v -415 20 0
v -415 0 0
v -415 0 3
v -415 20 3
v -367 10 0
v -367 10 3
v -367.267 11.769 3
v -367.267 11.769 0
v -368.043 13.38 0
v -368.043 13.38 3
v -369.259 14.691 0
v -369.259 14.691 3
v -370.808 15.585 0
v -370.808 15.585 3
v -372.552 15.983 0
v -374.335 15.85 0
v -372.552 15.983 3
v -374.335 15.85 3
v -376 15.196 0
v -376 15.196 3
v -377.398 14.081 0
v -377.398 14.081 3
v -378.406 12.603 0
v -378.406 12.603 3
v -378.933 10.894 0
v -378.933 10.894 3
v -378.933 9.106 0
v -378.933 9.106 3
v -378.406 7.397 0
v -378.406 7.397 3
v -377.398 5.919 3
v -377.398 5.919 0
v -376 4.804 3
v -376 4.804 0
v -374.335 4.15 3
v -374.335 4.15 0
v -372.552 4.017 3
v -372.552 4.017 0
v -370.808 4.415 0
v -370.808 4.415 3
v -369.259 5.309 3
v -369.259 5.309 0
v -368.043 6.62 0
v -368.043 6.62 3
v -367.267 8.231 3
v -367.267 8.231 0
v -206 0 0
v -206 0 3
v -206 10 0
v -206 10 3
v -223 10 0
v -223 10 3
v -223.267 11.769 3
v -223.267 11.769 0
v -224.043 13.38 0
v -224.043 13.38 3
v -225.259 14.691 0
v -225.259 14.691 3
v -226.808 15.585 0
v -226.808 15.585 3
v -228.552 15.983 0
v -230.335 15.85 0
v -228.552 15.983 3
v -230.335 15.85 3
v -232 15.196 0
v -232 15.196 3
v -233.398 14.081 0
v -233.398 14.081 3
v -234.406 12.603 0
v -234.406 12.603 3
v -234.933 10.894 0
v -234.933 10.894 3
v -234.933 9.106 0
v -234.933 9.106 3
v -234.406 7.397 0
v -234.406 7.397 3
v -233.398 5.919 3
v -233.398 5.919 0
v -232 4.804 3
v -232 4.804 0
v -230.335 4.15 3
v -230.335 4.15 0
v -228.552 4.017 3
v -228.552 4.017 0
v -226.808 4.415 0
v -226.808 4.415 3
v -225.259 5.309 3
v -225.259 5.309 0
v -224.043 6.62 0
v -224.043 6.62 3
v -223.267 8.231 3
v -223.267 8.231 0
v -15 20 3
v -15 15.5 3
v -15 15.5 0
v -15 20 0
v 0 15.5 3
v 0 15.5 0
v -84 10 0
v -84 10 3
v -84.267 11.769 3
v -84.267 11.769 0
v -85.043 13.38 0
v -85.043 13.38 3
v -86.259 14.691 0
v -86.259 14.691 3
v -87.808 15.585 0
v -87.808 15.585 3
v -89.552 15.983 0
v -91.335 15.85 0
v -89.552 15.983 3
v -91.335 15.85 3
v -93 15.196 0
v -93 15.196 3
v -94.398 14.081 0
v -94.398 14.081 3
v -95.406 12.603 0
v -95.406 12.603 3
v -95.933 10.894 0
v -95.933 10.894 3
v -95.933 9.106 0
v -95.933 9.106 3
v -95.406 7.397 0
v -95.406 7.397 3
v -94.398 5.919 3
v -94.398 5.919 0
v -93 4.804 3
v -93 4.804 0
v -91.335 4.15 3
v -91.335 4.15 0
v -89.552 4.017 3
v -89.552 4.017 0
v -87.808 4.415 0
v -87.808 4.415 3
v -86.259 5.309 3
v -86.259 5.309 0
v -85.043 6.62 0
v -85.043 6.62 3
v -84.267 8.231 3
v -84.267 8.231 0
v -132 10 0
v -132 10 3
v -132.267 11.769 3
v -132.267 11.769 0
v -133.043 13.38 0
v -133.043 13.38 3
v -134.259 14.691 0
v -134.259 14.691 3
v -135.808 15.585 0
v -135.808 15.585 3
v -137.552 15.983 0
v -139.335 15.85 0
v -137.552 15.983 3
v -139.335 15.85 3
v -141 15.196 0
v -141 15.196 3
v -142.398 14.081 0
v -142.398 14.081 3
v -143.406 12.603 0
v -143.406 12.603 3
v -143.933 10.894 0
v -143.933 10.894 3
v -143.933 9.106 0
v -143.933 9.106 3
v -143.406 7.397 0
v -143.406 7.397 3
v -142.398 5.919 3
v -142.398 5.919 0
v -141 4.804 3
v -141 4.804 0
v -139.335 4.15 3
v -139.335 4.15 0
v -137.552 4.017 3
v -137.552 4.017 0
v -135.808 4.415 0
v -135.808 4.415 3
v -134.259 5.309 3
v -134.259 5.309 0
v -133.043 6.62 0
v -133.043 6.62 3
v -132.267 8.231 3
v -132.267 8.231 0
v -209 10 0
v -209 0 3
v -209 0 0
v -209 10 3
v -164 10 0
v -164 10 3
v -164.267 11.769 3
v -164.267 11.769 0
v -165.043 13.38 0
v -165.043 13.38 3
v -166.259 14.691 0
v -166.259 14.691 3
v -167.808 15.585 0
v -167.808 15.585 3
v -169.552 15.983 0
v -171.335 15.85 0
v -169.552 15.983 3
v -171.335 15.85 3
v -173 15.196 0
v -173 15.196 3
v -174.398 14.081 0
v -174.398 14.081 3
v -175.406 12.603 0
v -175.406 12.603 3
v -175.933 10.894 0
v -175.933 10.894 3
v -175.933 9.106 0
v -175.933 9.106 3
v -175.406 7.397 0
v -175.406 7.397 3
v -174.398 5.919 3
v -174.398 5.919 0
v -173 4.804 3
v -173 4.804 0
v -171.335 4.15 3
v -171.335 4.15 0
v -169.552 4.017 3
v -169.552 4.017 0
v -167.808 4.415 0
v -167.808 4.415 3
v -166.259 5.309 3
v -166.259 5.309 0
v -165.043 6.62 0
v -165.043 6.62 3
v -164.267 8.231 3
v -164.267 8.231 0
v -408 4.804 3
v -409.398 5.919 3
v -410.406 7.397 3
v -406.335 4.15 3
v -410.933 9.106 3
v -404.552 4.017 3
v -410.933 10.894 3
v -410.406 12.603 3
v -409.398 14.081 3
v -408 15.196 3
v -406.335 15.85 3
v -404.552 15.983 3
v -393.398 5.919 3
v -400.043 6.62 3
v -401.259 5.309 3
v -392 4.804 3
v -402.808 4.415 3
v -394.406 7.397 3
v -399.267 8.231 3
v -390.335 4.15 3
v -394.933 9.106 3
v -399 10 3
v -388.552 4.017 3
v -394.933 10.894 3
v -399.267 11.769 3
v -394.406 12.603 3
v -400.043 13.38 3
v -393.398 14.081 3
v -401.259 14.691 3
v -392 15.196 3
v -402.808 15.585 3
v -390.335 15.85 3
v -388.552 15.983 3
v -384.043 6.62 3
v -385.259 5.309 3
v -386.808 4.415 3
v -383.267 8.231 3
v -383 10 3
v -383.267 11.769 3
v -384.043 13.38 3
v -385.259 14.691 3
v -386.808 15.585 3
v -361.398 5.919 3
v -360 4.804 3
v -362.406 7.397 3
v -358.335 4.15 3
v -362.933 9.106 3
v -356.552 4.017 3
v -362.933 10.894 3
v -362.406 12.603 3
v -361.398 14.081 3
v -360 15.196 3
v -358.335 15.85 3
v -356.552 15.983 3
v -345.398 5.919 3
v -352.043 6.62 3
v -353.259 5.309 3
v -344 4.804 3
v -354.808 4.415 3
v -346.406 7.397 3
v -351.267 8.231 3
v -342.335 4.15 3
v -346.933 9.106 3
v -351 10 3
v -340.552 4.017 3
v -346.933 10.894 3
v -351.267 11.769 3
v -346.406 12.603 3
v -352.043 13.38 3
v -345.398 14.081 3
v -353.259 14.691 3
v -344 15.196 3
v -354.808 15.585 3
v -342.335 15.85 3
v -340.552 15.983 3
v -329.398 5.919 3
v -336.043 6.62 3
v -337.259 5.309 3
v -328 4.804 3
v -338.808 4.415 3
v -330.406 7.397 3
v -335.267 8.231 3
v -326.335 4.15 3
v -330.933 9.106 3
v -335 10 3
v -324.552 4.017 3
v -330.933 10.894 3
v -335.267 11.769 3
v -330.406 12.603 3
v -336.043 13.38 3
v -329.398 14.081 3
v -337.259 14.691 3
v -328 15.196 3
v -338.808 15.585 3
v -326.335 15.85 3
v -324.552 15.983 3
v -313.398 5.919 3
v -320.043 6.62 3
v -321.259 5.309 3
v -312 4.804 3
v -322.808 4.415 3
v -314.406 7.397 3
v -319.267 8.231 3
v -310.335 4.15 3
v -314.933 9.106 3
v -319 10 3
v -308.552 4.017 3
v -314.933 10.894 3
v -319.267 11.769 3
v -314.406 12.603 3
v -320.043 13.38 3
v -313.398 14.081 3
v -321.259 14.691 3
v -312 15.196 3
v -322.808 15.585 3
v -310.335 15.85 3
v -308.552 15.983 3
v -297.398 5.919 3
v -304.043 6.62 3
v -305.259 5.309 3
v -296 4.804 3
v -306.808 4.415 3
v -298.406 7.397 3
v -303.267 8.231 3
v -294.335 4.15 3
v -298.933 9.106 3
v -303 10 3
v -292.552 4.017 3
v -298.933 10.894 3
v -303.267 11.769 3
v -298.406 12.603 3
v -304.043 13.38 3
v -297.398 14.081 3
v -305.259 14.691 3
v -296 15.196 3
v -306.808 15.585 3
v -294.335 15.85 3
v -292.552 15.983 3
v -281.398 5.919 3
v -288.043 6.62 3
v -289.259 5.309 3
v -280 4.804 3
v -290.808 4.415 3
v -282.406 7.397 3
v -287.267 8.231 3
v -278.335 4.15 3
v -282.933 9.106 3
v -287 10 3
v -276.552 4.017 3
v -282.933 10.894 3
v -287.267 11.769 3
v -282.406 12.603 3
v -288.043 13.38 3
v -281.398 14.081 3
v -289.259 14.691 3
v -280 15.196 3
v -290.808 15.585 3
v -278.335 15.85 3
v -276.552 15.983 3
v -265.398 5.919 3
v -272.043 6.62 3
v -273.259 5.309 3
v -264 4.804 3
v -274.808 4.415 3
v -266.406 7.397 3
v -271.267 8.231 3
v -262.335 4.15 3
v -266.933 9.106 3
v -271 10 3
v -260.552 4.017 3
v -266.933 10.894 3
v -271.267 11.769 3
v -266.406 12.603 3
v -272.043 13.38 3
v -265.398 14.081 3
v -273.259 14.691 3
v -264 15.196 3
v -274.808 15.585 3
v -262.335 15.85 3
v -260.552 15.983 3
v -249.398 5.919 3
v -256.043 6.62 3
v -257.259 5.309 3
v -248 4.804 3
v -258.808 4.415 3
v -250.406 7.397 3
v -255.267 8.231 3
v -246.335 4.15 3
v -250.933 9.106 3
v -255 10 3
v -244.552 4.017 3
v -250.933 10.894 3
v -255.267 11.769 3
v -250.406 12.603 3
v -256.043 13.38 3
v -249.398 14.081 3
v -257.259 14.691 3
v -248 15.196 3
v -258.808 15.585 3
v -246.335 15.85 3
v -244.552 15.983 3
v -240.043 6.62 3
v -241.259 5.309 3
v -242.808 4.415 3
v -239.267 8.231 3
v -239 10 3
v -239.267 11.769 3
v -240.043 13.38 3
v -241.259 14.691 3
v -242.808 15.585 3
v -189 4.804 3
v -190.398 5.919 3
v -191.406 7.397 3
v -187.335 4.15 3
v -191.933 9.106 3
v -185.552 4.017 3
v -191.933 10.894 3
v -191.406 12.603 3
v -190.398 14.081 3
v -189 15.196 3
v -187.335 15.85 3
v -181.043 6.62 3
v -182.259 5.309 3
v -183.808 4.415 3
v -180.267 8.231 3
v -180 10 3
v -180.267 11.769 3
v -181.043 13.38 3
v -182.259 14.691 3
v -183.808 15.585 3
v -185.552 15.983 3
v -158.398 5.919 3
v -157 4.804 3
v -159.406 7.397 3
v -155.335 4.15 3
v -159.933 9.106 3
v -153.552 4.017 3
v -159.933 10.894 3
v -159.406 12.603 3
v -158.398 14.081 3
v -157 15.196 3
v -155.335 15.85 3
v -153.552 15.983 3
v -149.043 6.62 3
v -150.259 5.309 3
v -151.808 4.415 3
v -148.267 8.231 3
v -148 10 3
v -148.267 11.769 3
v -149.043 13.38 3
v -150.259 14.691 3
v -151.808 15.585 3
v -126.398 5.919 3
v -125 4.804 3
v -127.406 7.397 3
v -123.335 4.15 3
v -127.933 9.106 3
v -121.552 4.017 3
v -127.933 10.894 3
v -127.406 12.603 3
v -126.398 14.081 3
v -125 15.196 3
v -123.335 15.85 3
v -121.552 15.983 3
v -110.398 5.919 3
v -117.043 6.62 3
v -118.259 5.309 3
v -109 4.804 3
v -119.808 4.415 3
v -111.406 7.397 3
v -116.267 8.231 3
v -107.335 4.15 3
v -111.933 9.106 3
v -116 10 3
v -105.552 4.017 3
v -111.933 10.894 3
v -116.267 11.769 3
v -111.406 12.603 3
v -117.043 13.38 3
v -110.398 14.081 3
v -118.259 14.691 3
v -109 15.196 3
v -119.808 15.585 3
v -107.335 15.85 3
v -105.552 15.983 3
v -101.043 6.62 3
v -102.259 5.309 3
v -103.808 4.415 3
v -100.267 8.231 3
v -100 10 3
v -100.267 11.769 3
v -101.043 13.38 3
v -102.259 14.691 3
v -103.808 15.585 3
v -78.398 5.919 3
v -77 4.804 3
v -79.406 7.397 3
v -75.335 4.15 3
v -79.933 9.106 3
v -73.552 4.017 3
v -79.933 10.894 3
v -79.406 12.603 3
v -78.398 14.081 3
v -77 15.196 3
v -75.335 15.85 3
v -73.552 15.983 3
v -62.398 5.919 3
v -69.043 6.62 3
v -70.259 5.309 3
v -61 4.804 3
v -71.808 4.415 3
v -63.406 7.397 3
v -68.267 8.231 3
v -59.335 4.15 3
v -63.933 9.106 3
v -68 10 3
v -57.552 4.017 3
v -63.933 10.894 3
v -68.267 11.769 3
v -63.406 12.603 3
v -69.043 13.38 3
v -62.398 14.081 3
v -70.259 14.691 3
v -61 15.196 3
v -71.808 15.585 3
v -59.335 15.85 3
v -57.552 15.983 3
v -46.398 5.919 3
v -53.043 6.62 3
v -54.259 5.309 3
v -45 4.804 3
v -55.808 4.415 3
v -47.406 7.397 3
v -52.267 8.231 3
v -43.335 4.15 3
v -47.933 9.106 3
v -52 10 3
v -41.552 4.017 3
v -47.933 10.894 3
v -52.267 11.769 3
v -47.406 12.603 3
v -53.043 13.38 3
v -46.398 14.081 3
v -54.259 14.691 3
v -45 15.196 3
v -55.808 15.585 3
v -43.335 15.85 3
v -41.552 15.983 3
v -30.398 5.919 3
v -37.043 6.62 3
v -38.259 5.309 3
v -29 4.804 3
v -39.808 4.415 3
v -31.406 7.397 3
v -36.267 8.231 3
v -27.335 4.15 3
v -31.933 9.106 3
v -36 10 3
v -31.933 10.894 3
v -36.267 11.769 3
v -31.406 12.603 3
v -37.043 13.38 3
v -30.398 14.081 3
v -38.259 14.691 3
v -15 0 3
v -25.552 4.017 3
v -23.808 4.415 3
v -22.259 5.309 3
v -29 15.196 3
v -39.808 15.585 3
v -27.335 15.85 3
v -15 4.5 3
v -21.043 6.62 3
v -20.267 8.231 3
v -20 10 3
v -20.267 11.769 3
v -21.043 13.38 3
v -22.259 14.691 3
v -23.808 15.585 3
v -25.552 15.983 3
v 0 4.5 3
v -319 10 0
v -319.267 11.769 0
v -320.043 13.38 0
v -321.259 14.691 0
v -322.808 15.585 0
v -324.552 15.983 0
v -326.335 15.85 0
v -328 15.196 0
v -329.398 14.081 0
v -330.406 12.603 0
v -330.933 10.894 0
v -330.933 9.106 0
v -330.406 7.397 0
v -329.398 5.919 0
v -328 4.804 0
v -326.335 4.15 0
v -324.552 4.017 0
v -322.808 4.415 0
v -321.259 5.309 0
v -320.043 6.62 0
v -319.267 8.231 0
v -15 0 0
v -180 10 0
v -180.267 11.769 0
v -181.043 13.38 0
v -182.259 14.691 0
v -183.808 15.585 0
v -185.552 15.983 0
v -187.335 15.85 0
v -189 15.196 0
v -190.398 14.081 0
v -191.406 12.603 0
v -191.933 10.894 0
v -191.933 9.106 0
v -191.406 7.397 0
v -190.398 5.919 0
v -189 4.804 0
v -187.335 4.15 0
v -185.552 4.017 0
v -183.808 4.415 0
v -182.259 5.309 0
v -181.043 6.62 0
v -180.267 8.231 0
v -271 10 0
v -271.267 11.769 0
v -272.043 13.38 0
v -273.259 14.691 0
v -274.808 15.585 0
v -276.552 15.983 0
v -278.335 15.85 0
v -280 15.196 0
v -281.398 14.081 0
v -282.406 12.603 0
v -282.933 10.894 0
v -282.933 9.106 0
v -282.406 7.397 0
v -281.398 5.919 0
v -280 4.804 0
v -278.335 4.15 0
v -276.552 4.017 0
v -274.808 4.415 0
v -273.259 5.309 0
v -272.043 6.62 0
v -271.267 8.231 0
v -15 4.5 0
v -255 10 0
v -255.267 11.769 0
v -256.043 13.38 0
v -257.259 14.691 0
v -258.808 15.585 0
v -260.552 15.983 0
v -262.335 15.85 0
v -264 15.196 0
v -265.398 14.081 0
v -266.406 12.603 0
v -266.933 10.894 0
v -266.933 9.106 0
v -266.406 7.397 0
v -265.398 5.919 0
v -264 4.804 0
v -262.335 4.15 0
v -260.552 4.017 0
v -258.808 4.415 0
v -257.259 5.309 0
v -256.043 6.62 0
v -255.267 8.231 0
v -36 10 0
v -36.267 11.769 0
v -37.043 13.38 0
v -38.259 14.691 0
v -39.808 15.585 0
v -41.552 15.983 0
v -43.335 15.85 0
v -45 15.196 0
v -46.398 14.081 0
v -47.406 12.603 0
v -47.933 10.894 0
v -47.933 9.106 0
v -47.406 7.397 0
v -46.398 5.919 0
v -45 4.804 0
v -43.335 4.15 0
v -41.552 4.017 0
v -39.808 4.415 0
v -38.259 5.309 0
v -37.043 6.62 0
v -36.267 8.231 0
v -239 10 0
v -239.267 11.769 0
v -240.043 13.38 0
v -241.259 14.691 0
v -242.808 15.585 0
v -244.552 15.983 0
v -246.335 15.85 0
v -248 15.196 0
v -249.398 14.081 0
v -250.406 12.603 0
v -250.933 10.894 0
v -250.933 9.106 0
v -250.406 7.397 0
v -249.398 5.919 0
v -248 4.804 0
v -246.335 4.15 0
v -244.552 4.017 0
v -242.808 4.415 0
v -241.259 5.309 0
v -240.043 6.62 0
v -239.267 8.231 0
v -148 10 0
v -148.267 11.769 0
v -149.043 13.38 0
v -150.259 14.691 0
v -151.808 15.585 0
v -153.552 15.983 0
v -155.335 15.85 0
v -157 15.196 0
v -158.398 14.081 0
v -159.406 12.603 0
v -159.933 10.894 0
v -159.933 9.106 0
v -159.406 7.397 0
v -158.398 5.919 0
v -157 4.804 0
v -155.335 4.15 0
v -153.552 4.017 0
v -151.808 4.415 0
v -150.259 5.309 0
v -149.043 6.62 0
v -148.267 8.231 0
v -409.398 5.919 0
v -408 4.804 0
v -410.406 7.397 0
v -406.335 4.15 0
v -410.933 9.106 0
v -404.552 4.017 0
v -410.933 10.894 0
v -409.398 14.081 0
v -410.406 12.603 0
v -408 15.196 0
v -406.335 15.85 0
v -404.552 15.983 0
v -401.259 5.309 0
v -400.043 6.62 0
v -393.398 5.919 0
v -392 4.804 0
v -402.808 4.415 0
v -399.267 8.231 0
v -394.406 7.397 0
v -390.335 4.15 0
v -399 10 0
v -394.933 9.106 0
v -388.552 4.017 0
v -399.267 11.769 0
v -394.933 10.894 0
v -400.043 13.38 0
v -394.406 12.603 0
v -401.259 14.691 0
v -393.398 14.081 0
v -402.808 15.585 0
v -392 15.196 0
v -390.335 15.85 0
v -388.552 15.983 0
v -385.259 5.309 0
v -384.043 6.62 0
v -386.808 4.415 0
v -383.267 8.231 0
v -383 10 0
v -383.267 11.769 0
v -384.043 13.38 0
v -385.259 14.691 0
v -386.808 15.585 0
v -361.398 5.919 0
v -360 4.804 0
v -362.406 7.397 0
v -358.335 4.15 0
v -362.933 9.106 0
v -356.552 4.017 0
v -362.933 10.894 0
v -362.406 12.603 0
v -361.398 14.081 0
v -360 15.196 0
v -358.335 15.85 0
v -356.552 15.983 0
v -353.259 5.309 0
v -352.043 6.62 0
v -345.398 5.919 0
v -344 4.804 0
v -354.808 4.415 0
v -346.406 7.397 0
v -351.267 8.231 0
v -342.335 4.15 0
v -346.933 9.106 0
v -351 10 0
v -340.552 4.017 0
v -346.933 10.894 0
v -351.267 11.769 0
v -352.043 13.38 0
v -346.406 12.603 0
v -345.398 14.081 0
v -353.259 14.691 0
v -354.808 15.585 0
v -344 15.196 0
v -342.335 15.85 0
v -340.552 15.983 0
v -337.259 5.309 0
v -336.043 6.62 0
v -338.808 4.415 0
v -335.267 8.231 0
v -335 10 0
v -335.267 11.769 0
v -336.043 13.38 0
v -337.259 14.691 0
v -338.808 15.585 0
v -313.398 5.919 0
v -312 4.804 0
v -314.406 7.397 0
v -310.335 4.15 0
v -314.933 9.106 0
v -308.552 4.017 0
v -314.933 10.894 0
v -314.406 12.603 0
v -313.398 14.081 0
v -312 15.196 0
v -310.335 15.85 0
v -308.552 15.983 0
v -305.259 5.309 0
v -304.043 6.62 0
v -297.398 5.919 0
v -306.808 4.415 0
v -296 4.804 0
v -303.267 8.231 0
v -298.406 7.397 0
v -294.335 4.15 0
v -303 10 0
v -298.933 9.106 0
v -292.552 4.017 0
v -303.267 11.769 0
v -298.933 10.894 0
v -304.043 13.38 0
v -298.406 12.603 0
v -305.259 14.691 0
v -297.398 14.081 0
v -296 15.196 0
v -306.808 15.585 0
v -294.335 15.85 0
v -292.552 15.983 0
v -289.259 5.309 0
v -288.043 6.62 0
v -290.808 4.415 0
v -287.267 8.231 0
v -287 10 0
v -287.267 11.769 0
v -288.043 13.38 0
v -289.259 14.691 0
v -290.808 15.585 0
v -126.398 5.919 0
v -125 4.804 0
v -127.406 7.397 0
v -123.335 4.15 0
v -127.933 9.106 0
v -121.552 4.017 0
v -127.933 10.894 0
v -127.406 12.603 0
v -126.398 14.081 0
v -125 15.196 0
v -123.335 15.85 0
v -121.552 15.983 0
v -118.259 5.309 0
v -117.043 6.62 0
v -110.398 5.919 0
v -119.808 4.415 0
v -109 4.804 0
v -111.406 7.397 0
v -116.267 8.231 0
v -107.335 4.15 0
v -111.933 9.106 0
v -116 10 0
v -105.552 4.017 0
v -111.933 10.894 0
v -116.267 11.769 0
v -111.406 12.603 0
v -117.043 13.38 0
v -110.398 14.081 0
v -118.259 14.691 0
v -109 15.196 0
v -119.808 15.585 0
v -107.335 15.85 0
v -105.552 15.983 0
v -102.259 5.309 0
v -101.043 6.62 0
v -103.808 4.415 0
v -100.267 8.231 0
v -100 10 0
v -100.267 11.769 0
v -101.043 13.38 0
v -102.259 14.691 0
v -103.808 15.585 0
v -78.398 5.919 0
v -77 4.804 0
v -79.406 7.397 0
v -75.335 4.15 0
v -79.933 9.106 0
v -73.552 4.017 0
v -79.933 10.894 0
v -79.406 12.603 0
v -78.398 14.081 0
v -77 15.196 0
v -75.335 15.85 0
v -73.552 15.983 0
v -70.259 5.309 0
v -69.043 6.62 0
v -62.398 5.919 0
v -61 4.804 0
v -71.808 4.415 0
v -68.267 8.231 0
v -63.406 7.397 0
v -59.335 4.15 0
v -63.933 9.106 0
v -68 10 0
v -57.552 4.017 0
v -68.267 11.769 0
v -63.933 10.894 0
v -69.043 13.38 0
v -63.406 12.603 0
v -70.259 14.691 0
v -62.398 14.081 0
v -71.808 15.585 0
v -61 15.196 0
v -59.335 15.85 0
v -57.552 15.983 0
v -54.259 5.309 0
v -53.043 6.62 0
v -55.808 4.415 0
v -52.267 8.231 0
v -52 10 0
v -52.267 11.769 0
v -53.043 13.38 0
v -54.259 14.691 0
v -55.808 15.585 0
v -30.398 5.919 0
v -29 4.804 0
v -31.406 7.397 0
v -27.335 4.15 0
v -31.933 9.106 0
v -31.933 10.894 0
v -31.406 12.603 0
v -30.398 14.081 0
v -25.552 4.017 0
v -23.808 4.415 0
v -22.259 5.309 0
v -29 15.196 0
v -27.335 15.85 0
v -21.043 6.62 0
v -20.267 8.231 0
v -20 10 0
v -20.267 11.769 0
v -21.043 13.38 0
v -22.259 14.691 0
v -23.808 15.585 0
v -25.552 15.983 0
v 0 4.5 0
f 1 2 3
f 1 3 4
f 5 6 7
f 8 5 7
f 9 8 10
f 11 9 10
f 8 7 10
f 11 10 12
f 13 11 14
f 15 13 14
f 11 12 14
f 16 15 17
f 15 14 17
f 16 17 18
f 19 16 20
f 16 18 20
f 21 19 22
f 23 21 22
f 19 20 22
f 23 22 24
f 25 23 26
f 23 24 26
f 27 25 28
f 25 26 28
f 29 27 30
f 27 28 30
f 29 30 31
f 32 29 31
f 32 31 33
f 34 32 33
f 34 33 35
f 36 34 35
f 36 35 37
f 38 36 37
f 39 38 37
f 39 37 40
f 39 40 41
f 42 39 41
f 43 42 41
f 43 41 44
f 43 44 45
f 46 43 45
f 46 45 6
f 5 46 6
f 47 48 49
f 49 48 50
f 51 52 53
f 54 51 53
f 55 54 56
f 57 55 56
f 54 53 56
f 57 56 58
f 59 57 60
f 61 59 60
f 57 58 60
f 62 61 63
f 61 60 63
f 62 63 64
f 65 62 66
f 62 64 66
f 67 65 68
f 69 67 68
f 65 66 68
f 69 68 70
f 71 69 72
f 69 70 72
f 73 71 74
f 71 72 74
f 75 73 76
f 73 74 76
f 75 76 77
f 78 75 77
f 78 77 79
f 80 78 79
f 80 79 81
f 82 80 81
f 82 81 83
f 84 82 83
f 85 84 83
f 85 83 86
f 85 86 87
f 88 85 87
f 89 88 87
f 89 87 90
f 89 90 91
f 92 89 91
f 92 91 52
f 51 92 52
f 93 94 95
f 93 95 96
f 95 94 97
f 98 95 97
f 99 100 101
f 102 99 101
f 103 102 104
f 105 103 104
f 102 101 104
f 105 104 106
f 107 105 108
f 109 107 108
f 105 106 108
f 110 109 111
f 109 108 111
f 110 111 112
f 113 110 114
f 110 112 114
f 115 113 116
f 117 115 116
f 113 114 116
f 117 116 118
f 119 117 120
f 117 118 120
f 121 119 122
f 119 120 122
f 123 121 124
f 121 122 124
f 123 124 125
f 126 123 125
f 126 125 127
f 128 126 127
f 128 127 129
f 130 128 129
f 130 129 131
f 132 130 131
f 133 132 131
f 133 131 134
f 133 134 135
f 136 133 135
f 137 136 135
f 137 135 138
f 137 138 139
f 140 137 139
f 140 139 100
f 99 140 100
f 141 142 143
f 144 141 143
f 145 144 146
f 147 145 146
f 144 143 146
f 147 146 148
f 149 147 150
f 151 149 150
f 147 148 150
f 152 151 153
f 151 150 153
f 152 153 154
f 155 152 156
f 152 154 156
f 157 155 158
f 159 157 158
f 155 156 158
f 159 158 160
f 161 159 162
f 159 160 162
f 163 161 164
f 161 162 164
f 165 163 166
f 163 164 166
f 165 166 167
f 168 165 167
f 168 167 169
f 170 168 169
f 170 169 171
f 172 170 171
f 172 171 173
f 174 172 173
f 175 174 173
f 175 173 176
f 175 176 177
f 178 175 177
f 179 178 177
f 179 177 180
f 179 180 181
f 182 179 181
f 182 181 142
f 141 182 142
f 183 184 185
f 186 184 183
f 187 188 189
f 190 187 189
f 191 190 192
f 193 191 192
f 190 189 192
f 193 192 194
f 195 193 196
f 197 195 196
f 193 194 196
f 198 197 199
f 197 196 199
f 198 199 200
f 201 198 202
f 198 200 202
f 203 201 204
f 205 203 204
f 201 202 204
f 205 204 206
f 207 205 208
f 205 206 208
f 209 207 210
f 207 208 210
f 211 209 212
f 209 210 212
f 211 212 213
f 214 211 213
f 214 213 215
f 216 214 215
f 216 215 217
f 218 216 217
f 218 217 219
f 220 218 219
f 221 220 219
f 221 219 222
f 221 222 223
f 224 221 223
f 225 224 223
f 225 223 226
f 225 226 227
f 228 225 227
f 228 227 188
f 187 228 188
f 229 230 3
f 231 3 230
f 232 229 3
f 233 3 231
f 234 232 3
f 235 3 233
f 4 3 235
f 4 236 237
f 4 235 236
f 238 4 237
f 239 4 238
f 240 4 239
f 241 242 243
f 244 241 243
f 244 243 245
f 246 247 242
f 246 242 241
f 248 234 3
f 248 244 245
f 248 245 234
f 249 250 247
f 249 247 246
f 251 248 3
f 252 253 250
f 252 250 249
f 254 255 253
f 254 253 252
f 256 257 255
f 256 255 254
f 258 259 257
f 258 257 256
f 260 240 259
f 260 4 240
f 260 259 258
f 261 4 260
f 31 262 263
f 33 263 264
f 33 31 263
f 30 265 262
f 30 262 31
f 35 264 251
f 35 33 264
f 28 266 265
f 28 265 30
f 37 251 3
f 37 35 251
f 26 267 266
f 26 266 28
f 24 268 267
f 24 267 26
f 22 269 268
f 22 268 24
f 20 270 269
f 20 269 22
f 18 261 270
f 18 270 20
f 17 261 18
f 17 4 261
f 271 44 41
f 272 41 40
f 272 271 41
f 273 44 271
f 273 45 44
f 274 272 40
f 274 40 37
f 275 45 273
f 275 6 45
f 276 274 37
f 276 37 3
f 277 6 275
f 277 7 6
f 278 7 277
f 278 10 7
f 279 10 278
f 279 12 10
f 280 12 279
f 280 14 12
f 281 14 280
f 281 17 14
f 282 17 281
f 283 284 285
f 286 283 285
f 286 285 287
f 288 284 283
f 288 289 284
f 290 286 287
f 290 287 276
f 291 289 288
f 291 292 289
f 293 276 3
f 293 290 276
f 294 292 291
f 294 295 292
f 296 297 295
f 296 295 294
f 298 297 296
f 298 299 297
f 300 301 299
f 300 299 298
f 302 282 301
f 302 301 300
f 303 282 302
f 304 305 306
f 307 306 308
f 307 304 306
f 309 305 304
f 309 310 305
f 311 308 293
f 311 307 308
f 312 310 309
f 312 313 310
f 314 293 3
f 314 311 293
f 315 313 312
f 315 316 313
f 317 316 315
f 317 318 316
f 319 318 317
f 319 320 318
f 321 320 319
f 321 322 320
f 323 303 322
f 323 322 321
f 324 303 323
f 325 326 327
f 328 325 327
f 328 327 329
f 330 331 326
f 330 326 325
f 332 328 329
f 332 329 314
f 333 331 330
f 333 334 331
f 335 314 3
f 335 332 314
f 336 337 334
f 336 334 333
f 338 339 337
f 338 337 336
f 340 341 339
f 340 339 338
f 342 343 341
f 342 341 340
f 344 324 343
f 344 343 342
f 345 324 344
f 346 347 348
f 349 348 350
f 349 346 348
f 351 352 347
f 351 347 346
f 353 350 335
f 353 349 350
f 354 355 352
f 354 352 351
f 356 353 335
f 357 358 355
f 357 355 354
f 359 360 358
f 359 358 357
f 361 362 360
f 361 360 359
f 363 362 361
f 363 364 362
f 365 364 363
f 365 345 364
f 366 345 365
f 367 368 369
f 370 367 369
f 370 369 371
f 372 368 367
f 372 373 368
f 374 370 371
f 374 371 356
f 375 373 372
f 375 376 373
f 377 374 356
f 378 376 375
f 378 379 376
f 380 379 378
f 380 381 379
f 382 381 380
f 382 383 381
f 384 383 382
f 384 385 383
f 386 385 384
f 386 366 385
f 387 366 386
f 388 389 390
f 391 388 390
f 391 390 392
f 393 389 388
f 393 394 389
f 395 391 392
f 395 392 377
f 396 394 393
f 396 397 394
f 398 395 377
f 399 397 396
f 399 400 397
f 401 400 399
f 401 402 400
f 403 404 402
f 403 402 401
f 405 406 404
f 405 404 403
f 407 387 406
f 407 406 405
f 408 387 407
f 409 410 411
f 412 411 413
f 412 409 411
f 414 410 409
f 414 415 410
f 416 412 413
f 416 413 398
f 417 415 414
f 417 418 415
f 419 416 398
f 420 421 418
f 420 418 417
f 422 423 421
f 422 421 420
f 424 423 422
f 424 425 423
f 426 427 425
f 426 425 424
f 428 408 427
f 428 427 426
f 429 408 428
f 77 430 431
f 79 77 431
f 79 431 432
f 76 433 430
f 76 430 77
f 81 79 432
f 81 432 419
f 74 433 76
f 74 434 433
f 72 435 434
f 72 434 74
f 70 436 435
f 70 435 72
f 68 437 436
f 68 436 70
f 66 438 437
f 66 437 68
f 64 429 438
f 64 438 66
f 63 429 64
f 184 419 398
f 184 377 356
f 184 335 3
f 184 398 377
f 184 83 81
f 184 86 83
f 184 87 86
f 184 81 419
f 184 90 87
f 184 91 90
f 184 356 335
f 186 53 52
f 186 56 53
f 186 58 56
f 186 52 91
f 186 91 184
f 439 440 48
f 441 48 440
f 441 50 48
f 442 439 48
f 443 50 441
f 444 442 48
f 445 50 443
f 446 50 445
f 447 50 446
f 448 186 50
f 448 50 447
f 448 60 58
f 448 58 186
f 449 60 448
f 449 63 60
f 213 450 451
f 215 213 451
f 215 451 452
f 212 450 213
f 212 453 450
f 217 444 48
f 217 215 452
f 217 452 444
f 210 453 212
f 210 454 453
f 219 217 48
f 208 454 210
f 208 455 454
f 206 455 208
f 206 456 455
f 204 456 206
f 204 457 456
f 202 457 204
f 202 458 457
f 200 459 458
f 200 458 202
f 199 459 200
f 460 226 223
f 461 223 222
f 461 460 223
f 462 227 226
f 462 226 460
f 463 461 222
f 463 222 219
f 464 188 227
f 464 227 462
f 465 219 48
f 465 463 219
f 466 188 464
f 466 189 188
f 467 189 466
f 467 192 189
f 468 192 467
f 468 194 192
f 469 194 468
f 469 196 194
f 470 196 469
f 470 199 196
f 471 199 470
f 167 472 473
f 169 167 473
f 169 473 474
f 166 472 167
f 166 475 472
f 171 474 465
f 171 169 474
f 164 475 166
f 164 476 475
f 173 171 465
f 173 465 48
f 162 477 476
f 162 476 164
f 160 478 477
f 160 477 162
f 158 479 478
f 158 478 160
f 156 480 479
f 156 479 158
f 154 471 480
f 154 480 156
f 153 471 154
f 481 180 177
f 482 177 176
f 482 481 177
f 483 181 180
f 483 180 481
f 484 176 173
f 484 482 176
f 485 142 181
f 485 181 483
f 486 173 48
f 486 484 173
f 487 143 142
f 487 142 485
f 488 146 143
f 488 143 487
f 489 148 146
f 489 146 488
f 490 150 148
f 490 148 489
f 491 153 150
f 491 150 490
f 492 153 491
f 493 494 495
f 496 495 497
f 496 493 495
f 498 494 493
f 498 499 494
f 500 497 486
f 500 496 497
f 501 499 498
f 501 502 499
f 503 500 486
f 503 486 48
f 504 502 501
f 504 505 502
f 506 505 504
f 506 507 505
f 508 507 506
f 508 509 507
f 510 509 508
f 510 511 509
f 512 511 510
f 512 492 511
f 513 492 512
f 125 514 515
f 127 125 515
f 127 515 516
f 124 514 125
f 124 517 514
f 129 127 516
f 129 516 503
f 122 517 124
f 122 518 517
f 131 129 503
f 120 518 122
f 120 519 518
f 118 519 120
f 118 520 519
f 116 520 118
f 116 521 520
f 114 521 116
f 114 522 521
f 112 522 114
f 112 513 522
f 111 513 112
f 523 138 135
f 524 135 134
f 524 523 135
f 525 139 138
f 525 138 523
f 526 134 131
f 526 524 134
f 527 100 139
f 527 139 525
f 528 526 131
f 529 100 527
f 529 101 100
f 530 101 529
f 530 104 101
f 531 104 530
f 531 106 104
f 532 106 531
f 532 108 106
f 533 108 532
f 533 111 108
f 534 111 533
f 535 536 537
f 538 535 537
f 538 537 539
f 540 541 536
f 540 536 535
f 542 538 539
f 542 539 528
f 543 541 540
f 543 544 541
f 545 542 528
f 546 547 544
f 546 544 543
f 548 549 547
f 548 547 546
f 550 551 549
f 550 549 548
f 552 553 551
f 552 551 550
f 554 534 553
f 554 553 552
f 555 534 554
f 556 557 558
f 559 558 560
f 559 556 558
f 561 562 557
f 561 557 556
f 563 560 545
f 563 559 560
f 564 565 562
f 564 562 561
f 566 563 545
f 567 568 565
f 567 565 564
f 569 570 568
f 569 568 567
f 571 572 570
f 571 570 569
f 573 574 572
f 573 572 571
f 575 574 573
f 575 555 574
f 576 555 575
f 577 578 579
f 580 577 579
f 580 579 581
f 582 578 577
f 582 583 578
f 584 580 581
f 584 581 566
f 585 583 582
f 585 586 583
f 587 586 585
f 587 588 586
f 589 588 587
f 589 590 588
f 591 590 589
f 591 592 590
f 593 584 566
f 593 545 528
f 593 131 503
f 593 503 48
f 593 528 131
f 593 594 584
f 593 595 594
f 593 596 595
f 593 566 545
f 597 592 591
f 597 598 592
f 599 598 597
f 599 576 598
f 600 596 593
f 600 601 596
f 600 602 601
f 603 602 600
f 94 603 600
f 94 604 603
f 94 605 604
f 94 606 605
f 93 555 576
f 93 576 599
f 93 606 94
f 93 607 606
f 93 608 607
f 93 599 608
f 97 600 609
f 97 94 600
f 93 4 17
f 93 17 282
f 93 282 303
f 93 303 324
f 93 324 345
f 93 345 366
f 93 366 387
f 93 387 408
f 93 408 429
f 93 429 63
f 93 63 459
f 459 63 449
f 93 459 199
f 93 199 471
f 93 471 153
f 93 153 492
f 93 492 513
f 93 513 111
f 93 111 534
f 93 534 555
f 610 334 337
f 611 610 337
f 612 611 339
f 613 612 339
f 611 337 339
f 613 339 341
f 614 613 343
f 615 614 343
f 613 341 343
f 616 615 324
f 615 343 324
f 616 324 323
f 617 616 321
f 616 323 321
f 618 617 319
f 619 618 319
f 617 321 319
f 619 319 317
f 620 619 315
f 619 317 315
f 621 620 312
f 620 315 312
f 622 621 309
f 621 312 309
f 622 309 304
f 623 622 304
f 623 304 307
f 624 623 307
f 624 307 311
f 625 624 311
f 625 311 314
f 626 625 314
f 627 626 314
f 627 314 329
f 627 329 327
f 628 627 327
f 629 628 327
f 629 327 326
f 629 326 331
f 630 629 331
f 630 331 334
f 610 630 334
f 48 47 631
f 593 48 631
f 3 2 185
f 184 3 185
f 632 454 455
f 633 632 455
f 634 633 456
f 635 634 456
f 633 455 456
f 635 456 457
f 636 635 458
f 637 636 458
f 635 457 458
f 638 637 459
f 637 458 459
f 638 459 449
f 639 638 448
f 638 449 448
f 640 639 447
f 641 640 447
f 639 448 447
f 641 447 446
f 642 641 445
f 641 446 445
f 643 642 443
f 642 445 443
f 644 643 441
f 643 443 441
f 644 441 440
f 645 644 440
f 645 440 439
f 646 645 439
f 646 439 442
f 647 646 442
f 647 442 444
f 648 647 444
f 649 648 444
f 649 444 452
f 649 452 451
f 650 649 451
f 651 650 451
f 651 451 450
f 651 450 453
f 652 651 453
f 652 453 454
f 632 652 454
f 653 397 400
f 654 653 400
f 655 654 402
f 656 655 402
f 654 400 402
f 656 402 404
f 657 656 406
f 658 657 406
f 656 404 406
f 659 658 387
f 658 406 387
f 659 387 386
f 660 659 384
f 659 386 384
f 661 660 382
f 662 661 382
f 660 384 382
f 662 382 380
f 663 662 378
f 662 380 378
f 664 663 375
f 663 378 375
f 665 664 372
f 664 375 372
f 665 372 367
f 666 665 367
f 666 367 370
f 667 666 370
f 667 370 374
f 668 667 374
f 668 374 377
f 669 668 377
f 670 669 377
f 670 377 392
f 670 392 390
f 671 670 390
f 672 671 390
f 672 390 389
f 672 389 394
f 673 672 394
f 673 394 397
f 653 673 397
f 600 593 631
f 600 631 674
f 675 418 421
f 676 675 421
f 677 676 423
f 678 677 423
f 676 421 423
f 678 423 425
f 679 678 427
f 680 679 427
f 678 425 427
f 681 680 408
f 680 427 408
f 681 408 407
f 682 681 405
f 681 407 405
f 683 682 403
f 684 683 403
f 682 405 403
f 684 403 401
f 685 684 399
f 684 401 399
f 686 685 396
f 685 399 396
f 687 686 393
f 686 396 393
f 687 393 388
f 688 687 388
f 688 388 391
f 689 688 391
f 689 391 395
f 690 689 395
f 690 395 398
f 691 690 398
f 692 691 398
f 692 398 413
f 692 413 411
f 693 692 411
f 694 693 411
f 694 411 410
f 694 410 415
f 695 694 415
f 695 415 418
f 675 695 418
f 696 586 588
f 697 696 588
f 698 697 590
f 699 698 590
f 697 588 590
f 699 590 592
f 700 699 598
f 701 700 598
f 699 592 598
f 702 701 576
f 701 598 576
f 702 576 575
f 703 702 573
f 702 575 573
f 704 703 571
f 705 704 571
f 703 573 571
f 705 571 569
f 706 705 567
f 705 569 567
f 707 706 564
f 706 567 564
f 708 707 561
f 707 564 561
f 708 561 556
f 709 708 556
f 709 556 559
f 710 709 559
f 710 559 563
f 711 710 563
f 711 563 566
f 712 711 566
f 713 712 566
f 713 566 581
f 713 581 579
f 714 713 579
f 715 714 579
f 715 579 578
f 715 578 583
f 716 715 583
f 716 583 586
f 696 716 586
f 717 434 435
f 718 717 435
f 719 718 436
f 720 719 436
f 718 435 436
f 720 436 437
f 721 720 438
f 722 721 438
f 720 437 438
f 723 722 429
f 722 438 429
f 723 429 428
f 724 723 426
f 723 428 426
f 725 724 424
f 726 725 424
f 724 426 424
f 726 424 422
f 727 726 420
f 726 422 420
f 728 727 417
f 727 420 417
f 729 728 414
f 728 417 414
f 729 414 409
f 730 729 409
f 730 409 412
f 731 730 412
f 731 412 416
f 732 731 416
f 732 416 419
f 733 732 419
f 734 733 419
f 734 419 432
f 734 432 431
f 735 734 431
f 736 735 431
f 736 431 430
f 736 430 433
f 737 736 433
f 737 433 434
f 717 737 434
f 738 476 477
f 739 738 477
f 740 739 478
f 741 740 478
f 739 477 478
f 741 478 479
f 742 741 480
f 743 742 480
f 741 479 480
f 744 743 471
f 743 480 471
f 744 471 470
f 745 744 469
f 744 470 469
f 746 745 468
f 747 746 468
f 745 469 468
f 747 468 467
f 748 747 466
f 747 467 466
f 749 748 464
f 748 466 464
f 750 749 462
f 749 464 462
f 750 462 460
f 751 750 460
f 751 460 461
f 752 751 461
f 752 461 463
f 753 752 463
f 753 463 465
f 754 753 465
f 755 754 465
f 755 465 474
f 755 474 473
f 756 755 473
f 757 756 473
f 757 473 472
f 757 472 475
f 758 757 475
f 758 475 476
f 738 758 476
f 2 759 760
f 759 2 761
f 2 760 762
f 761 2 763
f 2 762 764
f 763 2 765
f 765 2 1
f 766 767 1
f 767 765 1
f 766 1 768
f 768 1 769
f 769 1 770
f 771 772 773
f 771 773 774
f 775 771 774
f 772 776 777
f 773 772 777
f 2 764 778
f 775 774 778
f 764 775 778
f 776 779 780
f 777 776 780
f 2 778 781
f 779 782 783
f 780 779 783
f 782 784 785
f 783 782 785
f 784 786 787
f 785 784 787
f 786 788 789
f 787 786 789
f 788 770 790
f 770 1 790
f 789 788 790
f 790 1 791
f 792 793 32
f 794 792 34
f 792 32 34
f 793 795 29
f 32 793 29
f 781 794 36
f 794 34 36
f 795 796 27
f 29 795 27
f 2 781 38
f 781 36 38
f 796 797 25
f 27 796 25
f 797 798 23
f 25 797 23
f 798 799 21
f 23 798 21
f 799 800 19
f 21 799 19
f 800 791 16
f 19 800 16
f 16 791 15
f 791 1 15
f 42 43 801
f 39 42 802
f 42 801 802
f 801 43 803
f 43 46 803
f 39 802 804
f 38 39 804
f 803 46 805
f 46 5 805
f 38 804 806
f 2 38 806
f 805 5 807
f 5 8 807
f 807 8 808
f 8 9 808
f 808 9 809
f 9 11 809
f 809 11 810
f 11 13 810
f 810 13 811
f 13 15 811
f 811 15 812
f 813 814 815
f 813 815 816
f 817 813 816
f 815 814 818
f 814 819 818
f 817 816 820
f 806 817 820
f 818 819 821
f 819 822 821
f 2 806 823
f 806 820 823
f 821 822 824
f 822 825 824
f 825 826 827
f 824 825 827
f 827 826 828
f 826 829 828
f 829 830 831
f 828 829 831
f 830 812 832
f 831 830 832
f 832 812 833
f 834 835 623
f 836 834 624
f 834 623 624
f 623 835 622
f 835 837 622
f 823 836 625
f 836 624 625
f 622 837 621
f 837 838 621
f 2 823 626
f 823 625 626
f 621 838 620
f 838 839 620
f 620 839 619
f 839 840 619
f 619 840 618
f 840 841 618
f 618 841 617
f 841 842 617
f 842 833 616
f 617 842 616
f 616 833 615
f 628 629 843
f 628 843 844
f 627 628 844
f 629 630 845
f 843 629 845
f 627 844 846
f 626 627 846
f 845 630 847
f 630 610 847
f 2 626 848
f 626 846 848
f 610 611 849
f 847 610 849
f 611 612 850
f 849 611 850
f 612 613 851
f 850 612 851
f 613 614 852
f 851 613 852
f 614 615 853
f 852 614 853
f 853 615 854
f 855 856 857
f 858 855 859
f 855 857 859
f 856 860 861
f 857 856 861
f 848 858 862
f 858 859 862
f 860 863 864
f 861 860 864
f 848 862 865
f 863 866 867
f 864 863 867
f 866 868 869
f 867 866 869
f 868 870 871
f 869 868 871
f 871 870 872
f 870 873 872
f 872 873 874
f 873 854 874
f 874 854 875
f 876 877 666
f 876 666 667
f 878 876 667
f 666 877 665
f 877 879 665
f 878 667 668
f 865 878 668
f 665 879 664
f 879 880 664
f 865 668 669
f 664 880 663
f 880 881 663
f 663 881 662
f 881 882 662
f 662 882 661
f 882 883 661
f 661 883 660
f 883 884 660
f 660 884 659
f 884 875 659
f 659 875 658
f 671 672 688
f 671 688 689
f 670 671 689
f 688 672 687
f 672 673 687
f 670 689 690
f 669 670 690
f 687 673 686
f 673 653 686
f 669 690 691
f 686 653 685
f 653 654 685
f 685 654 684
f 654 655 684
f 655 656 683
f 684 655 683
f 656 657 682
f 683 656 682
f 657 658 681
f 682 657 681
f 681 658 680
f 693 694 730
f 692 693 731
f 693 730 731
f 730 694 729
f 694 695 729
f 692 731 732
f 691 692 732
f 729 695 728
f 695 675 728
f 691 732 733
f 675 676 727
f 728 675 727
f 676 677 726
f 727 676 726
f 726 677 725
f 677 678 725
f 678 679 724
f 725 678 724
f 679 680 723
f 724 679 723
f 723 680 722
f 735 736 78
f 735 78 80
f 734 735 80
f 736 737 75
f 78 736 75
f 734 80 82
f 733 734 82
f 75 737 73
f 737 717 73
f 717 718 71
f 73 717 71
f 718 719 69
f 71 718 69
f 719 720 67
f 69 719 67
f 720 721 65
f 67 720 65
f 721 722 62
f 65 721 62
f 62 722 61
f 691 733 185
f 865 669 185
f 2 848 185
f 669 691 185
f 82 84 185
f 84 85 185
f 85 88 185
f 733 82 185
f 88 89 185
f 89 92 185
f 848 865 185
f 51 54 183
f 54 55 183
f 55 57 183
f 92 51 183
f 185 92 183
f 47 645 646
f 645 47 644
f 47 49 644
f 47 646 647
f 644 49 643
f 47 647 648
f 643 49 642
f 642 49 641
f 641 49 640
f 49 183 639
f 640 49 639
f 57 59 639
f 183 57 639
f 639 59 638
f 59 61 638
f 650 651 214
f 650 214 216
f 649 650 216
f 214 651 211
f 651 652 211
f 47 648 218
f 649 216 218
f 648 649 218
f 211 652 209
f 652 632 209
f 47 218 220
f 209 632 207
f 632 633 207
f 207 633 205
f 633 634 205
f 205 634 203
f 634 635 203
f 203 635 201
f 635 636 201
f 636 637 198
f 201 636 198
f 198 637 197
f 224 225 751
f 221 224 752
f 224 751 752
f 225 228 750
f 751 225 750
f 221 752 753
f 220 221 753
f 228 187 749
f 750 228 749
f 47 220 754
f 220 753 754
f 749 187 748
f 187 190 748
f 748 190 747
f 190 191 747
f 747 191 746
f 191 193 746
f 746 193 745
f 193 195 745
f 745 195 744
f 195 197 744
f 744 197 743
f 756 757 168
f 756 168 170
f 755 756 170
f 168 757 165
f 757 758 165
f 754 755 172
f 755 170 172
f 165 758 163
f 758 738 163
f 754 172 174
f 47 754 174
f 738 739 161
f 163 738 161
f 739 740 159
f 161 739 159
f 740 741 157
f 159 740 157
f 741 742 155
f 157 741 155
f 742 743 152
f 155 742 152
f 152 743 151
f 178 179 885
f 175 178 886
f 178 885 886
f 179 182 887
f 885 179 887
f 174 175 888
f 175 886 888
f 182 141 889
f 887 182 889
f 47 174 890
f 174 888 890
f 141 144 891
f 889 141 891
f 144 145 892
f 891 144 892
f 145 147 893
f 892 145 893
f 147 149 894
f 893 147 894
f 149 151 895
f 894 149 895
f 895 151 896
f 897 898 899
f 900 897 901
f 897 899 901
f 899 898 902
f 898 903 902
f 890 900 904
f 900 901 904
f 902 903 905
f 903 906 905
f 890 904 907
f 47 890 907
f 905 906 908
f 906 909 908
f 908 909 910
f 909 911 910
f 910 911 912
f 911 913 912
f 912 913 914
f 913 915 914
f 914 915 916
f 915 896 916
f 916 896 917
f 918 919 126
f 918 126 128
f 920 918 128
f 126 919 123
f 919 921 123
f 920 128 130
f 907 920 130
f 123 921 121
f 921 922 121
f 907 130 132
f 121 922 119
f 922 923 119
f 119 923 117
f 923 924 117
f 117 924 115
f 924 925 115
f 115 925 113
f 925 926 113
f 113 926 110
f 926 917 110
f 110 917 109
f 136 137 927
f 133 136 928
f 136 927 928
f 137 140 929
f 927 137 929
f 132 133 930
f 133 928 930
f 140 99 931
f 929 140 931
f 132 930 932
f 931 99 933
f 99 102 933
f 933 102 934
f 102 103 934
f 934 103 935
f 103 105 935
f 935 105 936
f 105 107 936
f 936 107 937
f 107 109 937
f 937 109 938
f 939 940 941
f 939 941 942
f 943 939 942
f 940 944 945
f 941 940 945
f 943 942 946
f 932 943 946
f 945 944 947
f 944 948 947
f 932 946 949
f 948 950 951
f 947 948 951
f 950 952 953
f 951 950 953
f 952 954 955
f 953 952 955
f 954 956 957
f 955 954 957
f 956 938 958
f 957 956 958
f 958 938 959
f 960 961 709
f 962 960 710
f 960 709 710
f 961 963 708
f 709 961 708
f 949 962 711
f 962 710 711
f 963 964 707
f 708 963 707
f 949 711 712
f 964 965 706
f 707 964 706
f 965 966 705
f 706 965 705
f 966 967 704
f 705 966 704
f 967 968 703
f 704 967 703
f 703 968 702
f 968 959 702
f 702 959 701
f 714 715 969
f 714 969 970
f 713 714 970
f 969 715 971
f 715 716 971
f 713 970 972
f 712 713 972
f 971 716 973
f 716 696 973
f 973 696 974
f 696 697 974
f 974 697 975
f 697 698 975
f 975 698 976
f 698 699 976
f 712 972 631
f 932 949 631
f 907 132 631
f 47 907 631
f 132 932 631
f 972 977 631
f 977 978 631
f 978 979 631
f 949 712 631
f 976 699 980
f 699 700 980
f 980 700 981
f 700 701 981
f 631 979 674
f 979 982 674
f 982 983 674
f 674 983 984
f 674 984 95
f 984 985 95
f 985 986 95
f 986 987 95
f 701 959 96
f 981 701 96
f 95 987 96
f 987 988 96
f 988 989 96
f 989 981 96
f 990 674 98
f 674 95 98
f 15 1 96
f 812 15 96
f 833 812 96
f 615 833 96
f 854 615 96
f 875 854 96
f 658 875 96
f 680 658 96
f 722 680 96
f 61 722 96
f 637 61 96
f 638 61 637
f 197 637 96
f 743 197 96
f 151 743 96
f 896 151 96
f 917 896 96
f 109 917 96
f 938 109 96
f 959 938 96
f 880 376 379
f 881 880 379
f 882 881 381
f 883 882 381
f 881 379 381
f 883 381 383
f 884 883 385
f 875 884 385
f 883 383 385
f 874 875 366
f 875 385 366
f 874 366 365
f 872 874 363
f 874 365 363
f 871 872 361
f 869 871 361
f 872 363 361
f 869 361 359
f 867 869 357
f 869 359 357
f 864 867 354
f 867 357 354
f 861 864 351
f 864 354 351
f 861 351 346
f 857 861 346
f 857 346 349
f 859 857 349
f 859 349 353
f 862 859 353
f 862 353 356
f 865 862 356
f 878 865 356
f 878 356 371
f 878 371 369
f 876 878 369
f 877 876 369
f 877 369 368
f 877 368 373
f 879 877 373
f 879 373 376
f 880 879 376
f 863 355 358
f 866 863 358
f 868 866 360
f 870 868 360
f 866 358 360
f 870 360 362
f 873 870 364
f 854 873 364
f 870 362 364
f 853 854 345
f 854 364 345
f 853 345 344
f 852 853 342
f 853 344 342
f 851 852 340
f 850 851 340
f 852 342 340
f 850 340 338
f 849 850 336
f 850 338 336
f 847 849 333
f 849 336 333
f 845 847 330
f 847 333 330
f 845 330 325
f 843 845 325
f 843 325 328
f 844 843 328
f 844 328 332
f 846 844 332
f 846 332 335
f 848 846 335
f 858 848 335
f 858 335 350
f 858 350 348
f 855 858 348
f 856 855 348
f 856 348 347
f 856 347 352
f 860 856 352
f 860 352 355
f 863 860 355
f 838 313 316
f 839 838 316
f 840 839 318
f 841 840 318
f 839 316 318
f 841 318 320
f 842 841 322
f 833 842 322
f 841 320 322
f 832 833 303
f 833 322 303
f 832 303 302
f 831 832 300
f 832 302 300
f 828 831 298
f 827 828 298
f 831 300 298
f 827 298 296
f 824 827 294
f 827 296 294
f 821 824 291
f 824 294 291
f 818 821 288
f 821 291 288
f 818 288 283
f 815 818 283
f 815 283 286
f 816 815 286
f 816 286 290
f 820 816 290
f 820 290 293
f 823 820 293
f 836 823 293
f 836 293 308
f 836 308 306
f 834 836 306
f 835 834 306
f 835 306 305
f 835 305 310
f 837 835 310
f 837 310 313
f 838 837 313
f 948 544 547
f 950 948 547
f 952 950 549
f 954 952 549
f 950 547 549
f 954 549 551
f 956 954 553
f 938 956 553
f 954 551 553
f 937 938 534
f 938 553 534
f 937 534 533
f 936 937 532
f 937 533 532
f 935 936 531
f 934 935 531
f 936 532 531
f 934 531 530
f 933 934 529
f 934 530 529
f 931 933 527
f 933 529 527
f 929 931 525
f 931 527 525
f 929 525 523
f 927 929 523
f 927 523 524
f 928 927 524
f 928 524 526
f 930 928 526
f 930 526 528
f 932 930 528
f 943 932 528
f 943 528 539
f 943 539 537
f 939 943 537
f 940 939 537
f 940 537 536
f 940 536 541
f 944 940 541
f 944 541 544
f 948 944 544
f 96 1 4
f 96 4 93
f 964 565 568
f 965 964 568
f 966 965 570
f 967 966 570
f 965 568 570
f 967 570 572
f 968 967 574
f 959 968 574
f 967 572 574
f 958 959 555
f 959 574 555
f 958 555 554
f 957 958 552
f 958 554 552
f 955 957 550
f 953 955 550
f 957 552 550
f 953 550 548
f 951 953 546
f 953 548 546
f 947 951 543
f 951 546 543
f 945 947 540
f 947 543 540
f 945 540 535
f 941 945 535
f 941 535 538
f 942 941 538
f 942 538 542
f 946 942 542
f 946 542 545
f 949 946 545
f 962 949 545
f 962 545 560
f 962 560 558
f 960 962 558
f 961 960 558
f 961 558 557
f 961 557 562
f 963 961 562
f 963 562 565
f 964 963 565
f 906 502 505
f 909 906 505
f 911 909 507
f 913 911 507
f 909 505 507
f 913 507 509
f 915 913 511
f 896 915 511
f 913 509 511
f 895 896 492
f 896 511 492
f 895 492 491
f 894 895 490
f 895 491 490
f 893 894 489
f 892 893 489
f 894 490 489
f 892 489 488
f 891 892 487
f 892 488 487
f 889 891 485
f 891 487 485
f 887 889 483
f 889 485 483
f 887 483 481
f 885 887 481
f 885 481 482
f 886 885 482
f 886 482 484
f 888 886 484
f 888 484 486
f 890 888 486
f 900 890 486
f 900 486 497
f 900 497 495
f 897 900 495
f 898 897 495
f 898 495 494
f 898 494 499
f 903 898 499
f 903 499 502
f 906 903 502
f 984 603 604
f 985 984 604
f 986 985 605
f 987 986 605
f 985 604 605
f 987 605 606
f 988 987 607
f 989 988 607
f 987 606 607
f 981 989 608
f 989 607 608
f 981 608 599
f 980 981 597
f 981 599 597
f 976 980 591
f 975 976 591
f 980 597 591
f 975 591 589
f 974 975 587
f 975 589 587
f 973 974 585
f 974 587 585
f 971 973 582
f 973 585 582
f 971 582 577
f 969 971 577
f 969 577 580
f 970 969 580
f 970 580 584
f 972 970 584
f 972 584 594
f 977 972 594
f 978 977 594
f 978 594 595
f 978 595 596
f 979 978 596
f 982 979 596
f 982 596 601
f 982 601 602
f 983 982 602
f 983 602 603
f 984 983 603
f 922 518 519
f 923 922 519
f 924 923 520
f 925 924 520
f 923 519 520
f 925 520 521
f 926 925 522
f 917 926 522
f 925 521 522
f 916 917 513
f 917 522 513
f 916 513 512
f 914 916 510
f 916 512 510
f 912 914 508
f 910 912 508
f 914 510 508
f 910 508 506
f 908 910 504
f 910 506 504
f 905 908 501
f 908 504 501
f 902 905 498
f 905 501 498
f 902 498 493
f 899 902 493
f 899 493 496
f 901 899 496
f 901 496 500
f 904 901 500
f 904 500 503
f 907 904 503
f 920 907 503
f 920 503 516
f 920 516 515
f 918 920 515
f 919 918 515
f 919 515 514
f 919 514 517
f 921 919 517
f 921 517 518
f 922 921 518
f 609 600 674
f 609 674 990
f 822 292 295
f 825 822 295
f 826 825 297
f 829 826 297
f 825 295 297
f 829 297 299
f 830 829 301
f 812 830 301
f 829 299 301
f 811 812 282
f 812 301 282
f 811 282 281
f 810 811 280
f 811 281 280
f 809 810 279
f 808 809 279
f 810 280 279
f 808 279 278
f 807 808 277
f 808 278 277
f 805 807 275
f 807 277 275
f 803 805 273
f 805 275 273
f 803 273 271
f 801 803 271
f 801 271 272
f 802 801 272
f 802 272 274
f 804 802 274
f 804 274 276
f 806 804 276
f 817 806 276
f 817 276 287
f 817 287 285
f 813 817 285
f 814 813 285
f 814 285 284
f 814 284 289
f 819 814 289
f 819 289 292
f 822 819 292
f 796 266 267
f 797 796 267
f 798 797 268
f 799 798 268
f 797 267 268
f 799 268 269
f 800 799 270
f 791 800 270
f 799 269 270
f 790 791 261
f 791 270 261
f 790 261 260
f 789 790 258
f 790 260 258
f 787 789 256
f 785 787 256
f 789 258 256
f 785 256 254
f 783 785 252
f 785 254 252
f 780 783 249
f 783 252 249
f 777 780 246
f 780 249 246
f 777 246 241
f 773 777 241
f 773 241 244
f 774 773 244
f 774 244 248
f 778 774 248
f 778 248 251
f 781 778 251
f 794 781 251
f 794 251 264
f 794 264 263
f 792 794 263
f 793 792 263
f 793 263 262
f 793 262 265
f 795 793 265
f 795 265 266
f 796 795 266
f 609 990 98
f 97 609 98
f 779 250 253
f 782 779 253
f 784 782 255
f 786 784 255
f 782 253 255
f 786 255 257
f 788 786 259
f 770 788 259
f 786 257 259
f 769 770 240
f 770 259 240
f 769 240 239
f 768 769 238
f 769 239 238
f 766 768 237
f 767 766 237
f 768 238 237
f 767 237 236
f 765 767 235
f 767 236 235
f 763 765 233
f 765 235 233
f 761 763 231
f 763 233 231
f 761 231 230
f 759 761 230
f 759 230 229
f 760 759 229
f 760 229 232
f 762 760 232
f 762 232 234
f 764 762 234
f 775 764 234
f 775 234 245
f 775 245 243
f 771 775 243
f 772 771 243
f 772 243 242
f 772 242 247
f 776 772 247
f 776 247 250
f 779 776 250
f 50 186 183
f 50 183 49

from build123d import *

# Parameters (mm, degrees)
SKETCH1_W               = 415
SKETCH1_H               = 20
BOSS_EXTRUDE1_DEPTH     = 3
SKETCH2_R               = 6
SKETCH2_W               = 15
SKETCH2_H               = 4.5
SKETCH2_W_2             = 3
SKETCH2_H_2             = 10
CUT_EXTRUDE1_DEPTH      = 1
CUT_EXTRUDE1_DEPTH_BACK = 4


with BuildPart() as part:
    # Sketch1 → Boss-Extrude1 (new body)
    with BuildSketch(Plane.XY):
        with Locations((-207.5, 10)):
            Rectangle(SKETCH1_W, SKETCH1_H)
    extrude(amount=BOSS_EXTRUDE1_DEPTH)

    # Sketch2 → Cut-Extrude1 (cut, two sides)
    with BuildSketch(Plane.XY.offset(3)) as cut_extrude1_sk:
        with Locations((-405, 10)):
            Circle(SKETCH2_R)
        with Locations((-389, 10)):
            Circle(SKETCH2_R)
        with Locations((-373, 10)):
            Circle(SKETCH2_R)
        with Locations((-357, 10)):
            Circle(SKETCH2_R)
        with Locations((-341, 10)):
            Circle(SKETCH2_R)
        with Locations((-325, 10)):
            Circle(SKETCH2_R)
        with Locations((-309, 10)):
            Circle(SKETCH2_R)
        with Locations((-293, 10)):
            Circle(SKETCH2_R)
        with Locations((-277, 10)):
            Circle(SKETCH2_R)
        with Locations((-261, 10)):
            Circle(SKETCH2_R)
        with Locations((-245, 10)):
            Circle(SKETCH2_R)
        with Locations((-229, 10)):
            Circle(SKETCH2_R)
        with Locations((-26, 10)):
            Circle(SKETCH2_R)
        with Locations((-42, 10)):
            Circle(SKETCH2_R)
        with Locations((-58, 10)):
            Circle(SKETCH2_R)
        with Locations((-74, 10)):
            Circle(SKETCH2_R)
        with Locations((-90, 10)):
            Circle(SKETCH2_R)
        with Locations((-106, 10)):
            Circle(SKETCH2_R)
        with Locations((-122, 10)):
            Circle(SKETCH2_R)
        with Locations((-138, 10)):
            Circle(SKETCH2_R)
        with Locations((-154, 10)):
            Circle(SKETCH2_R)
        with Locations((-170, 10)):
            Circle(SKETCH2_R)
        with Locations((-186, 10)):
            Circle(SKETCH2_R)
        with Locations((-7.5, 17.75)):
            Rectangle(SKETCH2_W, SKETCH2_H)
        with Locations((-7.5, 2.25)):
            Rectangle(SKETCH2_W, SKETCH2_H)
        with Locations((-207.5, 5)):
            Rectangle(SKETCH2_W_2, SKETCH2_H_2)
    extrude(amount=CUT_EXTRUDE1_DEPTH, mode=Mode.SUBTRACT)
    extrude(cut_extrude1_sk.sketch, amount=-CUT_EXTRUDE1_DEPTH_BACK, mode=Mode.SUBTRACT)


solid = part.part
